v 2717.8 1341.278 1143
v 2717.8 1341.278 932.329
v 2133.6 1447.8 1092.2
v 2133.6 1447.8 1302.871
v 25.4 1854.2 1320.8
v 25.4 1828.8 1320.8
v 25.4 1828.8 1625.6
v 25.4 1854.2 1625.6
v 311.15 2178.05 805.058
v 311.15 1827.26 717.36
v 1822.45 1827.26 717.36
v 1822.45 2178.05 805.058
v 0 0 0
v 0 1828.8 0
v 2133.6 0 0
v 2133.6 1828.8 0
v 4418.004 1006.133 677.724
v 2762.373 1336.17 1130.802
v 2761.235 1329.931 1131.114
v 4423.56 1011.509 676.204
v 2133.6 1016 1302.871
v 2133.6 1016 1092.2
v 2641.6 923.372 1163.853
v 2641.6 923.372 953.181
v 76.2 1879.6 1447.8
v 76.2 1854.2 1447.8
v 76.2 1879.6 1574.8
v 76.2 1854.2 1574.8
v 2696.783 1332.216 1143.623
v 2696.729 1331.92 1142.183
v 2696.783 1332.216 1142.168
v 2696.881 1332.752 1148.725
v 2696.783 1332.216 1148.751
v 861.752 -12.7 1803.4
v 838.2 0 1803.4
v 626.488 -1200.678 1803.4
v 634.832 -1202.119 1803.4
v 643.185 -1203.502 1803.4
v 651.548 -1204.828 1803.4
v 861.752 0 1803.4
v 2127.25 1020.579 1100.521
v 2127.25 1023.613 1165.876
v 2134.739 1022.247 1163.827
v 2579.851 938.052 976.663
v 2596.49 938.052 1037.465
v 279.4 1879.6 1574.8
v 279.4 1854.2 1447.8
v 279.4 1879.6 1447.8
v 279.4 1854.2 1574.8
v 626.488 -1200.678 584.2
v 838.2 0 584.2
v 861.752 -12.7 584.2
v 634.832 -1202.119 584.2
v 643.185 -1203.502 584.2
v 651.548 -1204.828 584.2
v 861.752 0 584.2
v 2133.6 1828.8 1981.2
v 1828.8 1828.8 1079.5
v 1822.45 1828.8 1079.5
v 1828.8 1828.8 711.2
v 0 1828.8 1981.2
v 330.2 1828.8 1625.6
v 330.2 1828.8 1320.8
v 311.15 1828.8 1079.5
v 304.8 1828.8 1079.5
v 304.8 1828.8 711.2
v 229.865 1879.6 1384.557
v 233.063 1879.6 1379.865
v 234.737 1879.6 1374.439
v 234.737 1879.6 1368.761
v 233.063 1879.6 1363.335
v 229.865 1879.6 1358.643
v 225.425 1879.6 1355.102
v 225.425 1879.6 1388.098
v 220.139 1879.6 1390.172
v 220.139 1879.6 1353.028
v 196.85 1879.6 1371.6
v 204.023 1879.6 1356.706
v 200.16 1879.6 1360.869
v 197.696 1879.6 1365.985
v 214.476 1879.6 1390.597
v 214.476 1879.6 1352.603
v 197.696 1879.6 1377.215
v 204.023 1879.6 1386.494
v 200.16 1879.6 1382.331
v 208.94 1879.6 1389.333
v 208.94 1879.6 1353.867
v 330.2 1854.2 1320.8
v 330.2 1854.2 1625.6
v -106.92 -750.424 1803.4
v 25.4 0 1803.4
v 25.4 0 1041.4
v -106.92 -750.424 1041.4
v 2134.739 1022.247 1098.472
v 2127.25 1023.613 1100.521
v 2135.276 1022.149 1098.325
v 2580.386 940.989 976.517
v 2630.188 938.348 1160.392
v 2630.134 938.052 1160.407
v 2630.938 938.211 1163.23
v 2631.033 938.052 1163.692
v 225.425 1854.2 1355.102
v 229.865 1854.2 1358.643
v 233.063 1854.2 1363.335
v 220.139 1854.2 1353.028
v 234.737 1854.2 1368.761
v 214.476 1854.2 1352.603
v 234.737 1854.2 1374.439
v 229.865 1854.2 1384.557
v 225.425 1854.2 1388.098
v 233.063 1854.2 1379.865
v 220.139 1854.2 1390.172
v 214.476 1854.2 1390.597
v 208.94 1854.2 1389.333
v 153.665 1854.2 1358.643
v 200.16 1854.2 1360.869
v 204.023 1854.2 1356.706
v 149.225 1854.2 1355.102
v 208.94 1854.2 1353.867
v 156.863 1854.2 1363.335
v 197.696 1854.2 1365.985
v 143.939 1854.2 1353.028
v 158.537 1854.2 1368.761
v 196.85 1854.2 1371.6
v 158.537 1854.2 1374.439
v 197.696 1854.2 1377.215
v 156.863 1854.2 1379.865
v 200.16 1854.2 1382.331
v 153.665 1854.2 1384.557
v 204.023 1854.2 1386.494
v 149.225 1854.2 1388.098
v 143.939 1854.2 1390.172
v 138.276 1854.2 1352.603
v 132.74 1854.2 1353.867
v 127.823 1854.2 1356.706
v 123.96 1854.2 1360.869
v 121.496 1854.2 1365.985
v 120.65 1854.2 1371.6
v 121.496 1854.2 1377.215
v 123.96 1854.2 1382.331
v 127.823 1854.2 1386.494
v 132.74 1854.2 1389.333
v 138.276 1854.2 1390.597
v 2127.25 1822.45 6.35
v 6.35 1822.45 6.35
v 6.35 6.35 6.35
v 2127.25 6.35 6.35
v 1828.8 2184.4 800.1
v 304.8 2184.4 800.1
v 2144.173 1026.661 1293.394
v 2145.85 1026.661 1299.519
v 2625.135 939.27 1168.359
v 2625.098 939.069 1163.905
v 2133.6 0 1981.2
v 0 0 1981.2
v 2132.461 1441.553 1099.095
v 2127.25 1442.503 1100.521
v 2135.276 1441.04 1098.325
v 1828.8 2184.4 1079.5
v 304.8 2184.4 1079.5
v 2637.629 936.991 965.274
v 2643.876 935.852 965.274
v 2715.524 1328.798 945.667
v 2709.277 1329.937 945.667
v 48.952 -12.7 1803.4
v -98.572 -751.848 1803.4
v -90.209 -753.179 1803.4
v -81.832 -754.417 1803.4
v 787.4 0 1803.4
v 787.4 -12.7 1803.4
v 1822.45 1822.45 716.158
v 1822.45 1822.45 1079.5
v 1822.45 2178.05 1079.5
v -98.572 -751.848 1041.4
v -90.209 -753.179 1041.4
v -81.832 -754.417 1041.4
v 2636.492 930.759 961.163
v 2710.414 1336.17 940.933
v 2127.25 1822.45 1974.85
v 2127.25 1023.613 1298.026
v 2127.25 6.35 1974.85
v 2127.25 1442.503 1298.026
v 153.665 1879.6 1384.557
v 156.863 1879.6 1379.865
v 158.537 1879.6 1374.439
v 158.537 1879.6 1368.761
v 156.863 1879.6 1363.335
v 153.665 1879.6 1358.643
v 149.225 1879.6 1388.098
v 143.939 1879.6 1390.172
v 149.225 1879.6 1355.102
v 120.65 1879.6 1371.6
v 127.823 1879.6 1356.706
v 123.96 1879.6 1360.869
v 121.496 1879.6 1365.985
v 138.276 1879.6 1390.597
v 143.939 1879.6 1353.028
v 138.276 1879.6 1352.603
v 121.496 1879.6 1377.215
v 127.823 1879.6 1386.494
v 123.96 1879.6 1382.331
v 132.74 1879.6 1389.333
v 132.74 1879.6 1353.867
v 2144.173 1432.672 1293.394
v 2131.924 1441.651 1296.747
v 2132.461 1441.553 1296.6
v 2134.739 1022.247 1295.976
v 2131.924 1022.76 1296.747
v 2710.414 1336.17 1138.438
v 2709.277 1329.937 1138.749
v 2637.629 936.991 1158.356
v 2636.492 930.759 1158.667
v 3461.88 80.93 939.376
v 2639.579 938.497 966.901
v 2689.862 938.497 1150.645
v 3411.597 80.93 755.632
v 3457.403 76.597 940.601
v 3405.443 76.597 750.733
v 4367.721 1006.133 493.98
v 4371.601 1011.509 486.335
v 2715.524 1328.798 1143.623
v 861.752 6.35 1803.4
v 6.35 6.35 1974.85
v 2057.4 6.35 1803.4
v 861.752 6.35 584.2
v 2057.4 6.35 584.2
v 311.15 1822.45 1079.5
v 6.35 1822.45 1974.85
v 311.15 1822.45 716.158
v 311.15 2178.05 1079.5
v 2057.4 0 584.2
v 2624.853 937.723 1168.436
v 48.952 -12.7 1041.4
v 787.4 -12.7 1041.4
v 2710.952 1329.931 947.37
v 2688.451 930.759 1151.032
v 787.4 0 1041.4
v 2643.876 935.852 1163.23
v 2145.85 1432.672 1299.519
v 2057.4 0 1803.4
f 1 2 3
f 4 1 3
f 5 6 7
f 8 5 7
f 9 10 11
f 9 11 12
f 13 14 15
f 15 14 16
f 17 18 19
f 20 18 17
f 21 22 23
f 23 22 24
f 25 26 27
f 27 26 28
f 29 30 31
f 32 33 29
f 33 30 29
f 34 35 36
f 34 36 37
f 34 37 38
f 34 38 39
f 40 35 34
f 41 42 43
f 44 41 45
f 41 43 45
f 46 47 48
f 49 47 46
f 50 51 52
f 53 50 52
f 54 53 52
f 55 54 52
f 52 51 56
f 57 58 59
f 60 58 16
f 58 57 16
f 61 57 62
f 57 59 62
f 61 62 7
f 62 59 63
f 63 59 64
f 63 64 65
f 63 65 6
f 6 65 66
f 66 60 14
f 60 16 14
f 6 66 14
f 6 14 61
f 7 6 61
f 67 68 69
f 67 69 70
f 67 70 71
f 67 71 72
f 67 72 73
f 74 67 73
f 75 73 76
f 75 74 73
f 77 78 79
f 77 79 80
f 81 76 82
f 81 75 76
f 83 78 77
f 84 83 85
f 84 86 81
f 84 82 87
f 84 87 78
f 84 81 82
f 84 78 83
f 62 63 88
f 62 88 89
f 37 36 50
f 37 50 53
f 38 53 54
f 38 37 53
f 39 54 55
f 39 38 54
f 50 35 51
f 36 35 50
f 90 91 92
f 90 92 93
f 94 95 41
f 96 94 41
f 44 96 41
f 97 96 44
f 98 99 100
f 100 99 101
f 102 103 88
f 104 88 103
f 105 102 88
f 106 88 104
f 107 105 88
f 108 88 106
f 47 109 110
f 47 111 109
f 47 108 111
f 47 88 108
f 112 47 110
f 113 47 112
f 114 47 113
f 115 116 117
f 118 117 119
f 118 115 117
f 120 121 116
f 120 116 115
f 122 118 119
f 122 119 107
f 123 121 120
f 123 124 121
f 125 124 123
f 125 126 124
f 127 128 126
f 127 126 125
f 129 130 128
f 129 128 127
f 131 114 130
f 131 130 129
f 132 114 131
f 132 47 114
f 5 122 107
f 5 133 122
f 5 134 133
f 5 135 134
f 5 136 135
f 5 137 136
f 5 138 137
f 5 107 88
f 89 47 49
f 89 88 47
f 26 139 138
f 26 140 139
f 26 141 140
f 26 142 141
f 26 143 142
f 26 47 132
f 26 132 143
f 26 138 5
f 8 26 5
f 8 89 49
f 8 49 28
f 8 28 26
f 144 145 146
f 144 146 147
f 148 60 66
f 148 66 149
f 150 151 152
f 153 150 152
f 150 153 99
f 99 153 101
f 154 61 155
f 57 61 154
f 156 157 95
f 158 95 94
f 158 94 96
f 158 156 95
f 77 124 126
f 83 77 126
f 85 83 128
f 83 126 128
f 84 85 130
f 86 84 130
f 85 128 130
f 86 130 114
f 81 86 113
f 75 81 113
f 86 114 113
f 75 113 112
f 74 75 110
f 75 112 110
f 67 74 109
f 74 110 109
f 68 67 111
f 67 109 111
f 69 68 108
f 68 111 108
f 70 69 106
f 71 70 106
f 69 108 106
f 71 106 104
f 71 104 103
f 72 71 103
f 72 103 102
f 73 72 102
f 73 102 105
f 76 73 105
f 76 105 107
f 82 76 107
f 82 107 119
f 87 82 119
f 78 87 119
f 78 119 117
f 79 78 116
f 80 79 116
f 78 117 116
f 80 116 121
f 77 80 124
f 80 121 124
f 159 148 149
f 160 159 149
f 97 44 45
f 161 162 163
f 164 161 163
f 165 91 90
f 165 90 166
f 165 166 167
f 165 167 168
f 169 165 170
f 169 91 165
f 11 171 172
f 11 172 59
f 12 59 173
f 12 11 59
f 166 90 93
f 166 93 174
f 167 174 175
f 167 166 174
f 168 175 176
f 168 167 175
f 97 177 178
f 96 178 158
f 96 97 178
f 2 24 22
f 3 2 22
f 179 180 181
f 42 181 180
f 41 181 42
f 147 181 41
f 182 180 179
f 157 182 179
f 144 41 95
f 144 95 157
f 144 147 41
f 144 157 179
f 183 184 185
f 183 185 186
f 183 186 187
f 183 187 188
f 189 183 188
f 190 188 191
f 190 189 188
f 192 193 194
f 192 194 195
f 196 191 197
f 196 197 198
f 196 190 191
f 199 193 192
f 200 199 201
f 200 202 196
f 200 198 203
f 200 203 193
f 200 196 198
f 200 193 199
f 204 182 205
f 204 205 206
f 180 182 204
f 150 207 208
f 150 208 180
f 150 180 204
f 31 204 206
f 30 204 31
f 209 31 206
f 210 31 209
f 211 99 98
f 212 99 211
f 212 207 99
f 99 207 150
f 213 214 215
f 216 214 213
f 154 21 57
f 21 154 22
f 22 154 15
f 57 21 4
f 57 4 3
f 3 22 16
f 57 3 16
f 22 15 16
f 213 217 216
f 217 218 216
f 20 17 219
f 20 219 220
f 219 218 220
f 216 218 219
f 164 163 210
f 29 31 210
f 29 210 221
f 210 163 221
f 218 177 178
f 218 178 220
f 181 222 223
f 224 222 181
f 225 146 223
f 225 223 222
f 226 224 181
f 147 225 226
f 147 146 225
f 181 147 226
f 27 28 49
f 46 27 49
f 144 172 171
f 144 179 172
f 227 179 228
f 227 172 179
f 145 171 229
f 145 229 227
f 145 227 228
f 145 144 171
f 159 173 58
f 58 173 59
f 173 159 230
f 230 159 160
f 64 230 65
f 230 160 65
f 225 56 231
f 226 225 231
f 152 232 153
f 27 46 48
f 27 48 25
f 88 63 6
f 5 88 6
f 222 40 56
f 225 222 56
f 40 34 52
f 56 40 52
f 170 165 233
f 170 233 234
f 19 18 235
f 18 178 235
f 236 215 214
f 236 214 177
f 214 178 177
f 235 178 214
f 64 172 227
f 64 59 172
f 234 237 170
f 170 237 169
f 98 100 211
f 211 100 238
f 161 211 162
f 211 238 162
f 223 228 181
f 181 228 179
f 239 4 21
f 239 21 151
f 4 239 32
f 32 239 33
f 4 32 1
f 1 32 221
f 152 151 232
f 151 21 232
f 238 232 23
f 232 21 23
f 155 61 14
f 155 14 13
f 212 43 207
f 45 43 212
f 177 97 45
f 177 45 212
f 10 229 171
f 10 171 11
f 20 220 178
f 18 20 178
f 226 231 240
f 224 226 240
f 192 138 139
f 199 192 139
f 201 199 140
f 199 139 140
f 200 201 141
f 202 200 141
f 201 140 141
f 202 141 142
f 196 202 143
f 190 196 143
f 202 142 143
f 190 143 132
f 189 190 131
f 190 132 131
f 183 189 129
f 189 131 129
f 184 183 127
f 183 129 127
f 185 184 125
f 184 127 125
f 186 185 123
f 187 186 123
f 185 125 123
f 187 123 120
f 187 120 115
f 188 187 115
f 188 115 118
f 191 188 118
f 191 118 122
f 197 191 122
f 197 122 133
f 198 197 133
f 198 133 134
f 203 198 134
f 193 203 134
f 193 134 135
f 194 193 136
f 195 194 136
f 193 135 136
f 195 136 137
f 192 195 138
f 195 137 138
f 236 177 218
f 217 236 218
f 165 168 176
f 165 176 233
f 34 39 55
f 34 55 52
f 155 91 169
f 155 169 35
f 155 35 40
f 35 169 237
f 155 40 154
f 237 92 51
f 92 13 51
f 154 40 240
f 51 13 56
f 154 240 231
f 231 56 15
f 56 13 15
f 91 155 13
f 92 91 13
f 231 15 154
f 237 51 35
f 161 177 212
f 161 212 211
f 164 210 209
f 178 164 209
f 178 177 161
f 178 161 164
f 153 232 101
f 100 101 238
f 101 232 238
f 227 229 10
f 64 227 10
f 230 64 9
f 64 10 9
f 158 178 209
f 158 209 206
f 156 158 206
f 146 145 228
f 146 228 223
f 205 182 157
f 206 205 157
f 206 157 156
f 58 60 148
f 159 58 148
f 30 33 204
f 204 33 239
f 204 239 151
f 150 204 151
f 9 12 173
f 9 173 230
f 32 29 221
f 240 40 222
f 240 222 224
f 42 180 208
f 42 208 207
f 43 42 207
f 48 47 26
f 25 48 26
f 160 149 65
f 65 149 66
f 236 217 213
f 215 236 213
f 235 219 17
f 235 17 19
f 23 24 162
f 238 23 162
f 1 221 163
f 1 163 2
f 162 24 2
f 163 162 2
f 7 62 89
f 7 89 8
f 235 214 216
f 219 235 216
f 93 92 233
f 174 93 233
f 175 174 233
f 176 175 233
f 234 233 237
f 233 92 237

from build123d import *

# Parameters (mm, degrees)
F1_DEPTH    = 1981.2
F3_DEPTH    = 2184.401
F4_W        = 355.6
F4_H        = 901.7
F5_DEPTH    = 2717.801
F6_T        = 6.35
F6_T3_DEPTH = 381
F6_T5_DEPTH = 1536.7
F6_T7_DEPTH = 223.3713712335
F6_T9_DEPTH = 444.5
F8_DEPTH    = 196.85
F10_DEPTH   = 19.05
F11_W       = 762
F11_H       = 762
F11_W_2     = 1219.2
F11_H_2     = 1219.2
F12_DEPTH   = 12.7
F14_DEPTH   = 1219.2
F15_DEPTH   = 25.4
F17_DEPTH   = 762
F18_W       = 304.8
F18_H       = 304.8
F19_DEPTH   = 25.4
F20_W       = 101.6
F20_H       = 127
F20_R       = 19.05
F21_DEPTH   = 25.4
F23_DEPTH   = 196.85
F24_T       = -6.35


# Not quite as in the source:
# - a shell that OpenCascade refuses in one call is made with other operations: the cavity is built on its own and cut out


with BuildPart() as f1:
    # F0 (on Top) → F1 (new body)
    with BuildSketch(Plane.XY):
        Polygon((304.8, 1828.8), (0, 1828.8), (0, 0), (2133.6, 0), (2133.6, 1016), (2133.6, 1447.8), (2133.6, 1828.8), (1828.8, 1828.8), (1828.8, 2184.4), (304.8, 2184.4), align=None)
        Polygon((2133.6, 1447.8), (2133.6, 1016), (2641.6, 923.3724416764), (2717.8, 1341.2783079278), align=None)
    extrude(amount=F1_DEPTH)

    # F2 (on Front) → F3 (cut, through all)
    with BuildSketch(Plane.XZ):
        Polygon((2717.8, 1981.2), (2133.6, 1981.2), (2133.6, 1302.8713712335), (2717.8, 1143), align=None)
        Polygon((2133.6, 1092.2), (2133.6, 0), (2717.8, 0), (2717.8, 932.3286287665), align=None)
    extrude(amount=-F3_DEPTH, mode=Mode.SUBTRACT)

    # F4 (on face) → F5 (cut, through all)
    with BuildSketch(Plane(origin=(0, 0, 0), x_dir=(0, -1, 0), z_dir=(-1, 0, 0))):
        with Locations((-2006.6, 1530.35)):
            Rectangle(F4_W, F4_H)
        Polygon((-2184.4, 0), (-1828.8, 0), (-1828.8, 711.2), (-2184.4, 800.1), align=None)
    extrude(amount=-F5_DEPTH, mode=Mode.SUBTRACT)

    # F6: shell of thickness 6.35, made by hand


with BuildPart() as f6_core1:
    # F6_t2: copy of F1
    add(f1.part)

    # the walls: a layer under each face that stays
    f6_faces = [f6_core1.faces().sort_by_distance(p)[0] for p in [
        (1778, 1828.8, 1651),
        (1066.8, 2006.6, 755.65),
        (1066.8, 2184.4, 939.8),
        (1828.8, 2006.6, 895.35),
        (304.8, 2006.6, 895.35),
        (0, 914.4, 990.6),
        (1066.8, 0, 990.6),
        (1066.8, 914.4, 1981.2),
        (2133.6, 914.4, 990.6),
        (2425.7, 1185.5862208382, 1012.2643143833),
        (2679.7, 1132.3253748021, 1048.0907081594),
        (2387.6, 969.6862208382, 1128.0263937761),
        (2425.7, 1185.5862208382, 1222.9356856167),
        (2425.7, 1394.5391539639, 1117.6),
        (1066.8, 914.4, 0),
    ]]
    thicken(f6_faces, amount=-F6_T, mode=Mode.SUBTRACT)

    # F6_s4 → F6_t3 (cut)
    with BuildSketch(Plane.XY.offset(704.85)):
        Polygon((304.7365, 1828.8635), (304.8, 1822.45), (311.15, 1822.45), (311.15, 1828.8), align=None)
        Polygon((1828.8635, 1828.8635), (1828.8, 1822.45), (1822.45, 1822.45), (1822.45, 1828.8), align=None)
    extrude(amount=F6_T3_DEPTH, mode=Mode.SUBTRACT)

    # F6_s6 → F6_t5 (cut)
    with BuildSketch(Plane.YZ.offset(298.45)):
        Polygon((1828.8789010122, 711.1383959512), (1822.45, 711.2), (1822.45, 716.1579301807), (1827.259898781, 717.3604048759), align=None)
    extrude(amount=F6_T5_DEPTH, mode=Mode.SUBTRACT)

    # F6_s8 → F6_t7 (cut)
    with BuildSketch(Plane.XY.offset(1085.85)):
        Polygon((2133.6748906405, 1447.8624700193), (2127.25, 1447.8), (2127.25, 1442.5031482168), (2132.4609359537, 1441.5529980712), align=None)
        Polygon((2133.6521093595, 1015.9375299807), (2127.25, 1016), (2127.25, 1023.6125407413), (2134.7390640463, 1022.2470019288), align=None)
    extrude(amount=F6_T7_DEPTH, mode=Mode.SUBTRACT)

    # F6_s10 → F6_t9 (cut)
    with BuildSketch(Plane.XZ.offset(-1454.15)):
        Polygon((2133.6802610435, 1302.9326192328), (2127.25, 1302.8713712335), (2127.25, 1298.0256231785), (2131.9238956462, 1296.7465713025), align=None)
        Polygon((2133.6467389565, 1092.1387520007), (2127.25, 1092.2), (2127.25, 1100.5212126471), (2135.2761043538, 1098.324799931), align=None)
    extrude(amount=F6_T9_DEPTH, mode=Mode.SUBTRACT)


with BuildPart() as f1_1:
    add(f1.part)

    # what is left inside the walls is the cavity
    f6_cavity = [f6_core1.part.solids().sort_by_distance(p)[0] for p in [
        (1066.8, 6.4135, 1318.683333),
    ]]
    add(f6_cavity, mode=Mode.SUBTRACT)

    # F7 (on face) → F8 (cut)
    with BuildSketch(Plane(origin=(480.3521470905, 0, 1755.2969125438), x_dir=(0.9645354222, 0, -0.2639534415), z_dir=(0.2639534415, 0, 0.9645354222))):
        Polygon((1726.7353944944, 1026.6613500194), (2230.5640168439, 938.0524140666), (2304.8472958363, 1330.9982978041), (1726.7353944944, 1432.6715219268), align=None)
    extrude(amount=-F8_DEPTH, mode=Mode.SUBTRACT)

    # F9 (on face) → F10 (cut)
    with BuildSketch(Plane(origin=(2393.6525155954, -436.4531259741, 0), x_dir=(0.1793801648, 0.9837798313, 0), z_dir=(0.9837798313, -0.1793801648, 0))):
        Polygon((1794.3562029508, 945.6666515071), (1794.3562029508, 1143.6227302064), (1394.9315845226, 1163.2300573458), (1394.9315845226, 965.2739786465), align=None)
        Polygon((1394.9315845226, 1163.2300573458), (1794.3562029508, 1143.6227302064), (1798.9468574524, 1186.6028308868), (1379.6262741089, 1213.9142751694), align=None)
    extrude(amount=-F10_DEPTH, mode=Mode.SUBTRACT)

    # F11 (on face) → F12 (join)
    with BuildSketch(Plane.XZ):
        with Locations((406.4, 1422.4)):
            Rectangle(F11_W, F11_H)
        with Locations((1447.8, 1193.8)):
            Rectangle(F11_W_2, F11_H_2)
    extrude(amount=F12_DEPTH)

    # F13 (on face) → F14 (join, through all)
    with BuildSketch(Plane.XY.offset(1803.4)):
        with BuildLine():
            Line((838.2, 0), (626.4881417885, -1200.6776124725))
            ThreePointArc((626.4881417885, -1200.6776124725), (639.0073665936, -1202.8179142317), (651.548208115, -1204.8276841881))
            Line((651.548208115, -1204.8276841881), (861.7524832869, -12.7))
            Line((861.7524832869, -12.7), (838.2, -12.7))
            Line((838.2, -12.7), (838.2, 0))
        make_face()
    extrude(amount=-F14_DEPTH)

    # F15 (cut): a face of the model
    f15_faces = [f1_1.faces().sort_by_distance(p)[0] for p in [
        (1459.5762416435, -12.7, 1193.8),
    ]]
    extrude(f15_faces, amount=-F15_DEPTH, mode=Mode.SUBTRACT)

    # F16 (on face) → F17 (join, through all)
    with BuildSketch(Plane.XY.offset(1803.4)):
        with BuildLine():
            Line((25.4, 0), (-106.9199113822, -750.4235077953))
            ThreePointArc((-106.9199113822, -750.4235077953), (-94.3927308322, -752.524884399), (-81.8322629627, -754.4171536888))
            Line((-81.8322629627, -754.4171536888), (48.9524832869, -12.7))
            Line((48.9524832869, -12.7), (25.4, -12.7))
            Line((25.4, -12.7), (25.4, 0))
        make_face()
    extrude(amount=-F17_DEPTH)

    # F18 (on face) → F19 (join)
    with BuildSketch(Plane(origin=(0, 1828.8, 0), x_dir=(-1, 0, 0), z_dir=(0, 1, 0))):
        with Locations((-177.8, 1473.2)):
            Rectangle(F18_W, F18_H)
    extrude(amount=F19_DEPTH)

    # F20 (on face) → F21 (join)
    with BuildSketch(Plane(origin=(0, 1854.2, 0), x_dir=(-1, 0, 0), z_dir=(0, 1, 0))):
        with Locations((-228.6, 1511.3)):
            Rectangle(F20_W, F20_H)
        with Locations((-127, 1511.3)):
            Rectangle(F20_W, F20_H)
        with Locations((-215.9, 1371.6)):
            Circle(F20_R)
        with Locations((-139.7, 1371.6)):
            Circle(F20_R)
    extrude(amount=F21_DEPTH)


with BuildPart() as f23:
    # F22 (on face) → F23 (new body, through all)
    with BuildSketch(Plane(origin=(428.392912122, 0, 1565.428114682), x_dir=(0.9645354222, 0, -0.2639534415), z_dir=(0.2639534415, 0, 0.9645354222))):
        Polygon((2365.9276469879, 1336.1703700453), (2289.2877743556, 930.7585076514), (3086.5123505597, 76.5972025713), (4088.1940606272, 1011.5087609039), align=None)
    extrude(amount=F23_DEPTH)

    # F24
    f24_openings = [f23.faces().sort_by_distance(p)[0] for p in [
        (3451.053503, 803.590618, 942.338851),
        (3914.501768, 544.052982, 713.468289),
        (2699.432616, 1133.464439, 1045.982448),
    ]]
    offset(amount=F24_T, openings=f24_openings)


solid = Compound([f1_1.part, f23.part])
